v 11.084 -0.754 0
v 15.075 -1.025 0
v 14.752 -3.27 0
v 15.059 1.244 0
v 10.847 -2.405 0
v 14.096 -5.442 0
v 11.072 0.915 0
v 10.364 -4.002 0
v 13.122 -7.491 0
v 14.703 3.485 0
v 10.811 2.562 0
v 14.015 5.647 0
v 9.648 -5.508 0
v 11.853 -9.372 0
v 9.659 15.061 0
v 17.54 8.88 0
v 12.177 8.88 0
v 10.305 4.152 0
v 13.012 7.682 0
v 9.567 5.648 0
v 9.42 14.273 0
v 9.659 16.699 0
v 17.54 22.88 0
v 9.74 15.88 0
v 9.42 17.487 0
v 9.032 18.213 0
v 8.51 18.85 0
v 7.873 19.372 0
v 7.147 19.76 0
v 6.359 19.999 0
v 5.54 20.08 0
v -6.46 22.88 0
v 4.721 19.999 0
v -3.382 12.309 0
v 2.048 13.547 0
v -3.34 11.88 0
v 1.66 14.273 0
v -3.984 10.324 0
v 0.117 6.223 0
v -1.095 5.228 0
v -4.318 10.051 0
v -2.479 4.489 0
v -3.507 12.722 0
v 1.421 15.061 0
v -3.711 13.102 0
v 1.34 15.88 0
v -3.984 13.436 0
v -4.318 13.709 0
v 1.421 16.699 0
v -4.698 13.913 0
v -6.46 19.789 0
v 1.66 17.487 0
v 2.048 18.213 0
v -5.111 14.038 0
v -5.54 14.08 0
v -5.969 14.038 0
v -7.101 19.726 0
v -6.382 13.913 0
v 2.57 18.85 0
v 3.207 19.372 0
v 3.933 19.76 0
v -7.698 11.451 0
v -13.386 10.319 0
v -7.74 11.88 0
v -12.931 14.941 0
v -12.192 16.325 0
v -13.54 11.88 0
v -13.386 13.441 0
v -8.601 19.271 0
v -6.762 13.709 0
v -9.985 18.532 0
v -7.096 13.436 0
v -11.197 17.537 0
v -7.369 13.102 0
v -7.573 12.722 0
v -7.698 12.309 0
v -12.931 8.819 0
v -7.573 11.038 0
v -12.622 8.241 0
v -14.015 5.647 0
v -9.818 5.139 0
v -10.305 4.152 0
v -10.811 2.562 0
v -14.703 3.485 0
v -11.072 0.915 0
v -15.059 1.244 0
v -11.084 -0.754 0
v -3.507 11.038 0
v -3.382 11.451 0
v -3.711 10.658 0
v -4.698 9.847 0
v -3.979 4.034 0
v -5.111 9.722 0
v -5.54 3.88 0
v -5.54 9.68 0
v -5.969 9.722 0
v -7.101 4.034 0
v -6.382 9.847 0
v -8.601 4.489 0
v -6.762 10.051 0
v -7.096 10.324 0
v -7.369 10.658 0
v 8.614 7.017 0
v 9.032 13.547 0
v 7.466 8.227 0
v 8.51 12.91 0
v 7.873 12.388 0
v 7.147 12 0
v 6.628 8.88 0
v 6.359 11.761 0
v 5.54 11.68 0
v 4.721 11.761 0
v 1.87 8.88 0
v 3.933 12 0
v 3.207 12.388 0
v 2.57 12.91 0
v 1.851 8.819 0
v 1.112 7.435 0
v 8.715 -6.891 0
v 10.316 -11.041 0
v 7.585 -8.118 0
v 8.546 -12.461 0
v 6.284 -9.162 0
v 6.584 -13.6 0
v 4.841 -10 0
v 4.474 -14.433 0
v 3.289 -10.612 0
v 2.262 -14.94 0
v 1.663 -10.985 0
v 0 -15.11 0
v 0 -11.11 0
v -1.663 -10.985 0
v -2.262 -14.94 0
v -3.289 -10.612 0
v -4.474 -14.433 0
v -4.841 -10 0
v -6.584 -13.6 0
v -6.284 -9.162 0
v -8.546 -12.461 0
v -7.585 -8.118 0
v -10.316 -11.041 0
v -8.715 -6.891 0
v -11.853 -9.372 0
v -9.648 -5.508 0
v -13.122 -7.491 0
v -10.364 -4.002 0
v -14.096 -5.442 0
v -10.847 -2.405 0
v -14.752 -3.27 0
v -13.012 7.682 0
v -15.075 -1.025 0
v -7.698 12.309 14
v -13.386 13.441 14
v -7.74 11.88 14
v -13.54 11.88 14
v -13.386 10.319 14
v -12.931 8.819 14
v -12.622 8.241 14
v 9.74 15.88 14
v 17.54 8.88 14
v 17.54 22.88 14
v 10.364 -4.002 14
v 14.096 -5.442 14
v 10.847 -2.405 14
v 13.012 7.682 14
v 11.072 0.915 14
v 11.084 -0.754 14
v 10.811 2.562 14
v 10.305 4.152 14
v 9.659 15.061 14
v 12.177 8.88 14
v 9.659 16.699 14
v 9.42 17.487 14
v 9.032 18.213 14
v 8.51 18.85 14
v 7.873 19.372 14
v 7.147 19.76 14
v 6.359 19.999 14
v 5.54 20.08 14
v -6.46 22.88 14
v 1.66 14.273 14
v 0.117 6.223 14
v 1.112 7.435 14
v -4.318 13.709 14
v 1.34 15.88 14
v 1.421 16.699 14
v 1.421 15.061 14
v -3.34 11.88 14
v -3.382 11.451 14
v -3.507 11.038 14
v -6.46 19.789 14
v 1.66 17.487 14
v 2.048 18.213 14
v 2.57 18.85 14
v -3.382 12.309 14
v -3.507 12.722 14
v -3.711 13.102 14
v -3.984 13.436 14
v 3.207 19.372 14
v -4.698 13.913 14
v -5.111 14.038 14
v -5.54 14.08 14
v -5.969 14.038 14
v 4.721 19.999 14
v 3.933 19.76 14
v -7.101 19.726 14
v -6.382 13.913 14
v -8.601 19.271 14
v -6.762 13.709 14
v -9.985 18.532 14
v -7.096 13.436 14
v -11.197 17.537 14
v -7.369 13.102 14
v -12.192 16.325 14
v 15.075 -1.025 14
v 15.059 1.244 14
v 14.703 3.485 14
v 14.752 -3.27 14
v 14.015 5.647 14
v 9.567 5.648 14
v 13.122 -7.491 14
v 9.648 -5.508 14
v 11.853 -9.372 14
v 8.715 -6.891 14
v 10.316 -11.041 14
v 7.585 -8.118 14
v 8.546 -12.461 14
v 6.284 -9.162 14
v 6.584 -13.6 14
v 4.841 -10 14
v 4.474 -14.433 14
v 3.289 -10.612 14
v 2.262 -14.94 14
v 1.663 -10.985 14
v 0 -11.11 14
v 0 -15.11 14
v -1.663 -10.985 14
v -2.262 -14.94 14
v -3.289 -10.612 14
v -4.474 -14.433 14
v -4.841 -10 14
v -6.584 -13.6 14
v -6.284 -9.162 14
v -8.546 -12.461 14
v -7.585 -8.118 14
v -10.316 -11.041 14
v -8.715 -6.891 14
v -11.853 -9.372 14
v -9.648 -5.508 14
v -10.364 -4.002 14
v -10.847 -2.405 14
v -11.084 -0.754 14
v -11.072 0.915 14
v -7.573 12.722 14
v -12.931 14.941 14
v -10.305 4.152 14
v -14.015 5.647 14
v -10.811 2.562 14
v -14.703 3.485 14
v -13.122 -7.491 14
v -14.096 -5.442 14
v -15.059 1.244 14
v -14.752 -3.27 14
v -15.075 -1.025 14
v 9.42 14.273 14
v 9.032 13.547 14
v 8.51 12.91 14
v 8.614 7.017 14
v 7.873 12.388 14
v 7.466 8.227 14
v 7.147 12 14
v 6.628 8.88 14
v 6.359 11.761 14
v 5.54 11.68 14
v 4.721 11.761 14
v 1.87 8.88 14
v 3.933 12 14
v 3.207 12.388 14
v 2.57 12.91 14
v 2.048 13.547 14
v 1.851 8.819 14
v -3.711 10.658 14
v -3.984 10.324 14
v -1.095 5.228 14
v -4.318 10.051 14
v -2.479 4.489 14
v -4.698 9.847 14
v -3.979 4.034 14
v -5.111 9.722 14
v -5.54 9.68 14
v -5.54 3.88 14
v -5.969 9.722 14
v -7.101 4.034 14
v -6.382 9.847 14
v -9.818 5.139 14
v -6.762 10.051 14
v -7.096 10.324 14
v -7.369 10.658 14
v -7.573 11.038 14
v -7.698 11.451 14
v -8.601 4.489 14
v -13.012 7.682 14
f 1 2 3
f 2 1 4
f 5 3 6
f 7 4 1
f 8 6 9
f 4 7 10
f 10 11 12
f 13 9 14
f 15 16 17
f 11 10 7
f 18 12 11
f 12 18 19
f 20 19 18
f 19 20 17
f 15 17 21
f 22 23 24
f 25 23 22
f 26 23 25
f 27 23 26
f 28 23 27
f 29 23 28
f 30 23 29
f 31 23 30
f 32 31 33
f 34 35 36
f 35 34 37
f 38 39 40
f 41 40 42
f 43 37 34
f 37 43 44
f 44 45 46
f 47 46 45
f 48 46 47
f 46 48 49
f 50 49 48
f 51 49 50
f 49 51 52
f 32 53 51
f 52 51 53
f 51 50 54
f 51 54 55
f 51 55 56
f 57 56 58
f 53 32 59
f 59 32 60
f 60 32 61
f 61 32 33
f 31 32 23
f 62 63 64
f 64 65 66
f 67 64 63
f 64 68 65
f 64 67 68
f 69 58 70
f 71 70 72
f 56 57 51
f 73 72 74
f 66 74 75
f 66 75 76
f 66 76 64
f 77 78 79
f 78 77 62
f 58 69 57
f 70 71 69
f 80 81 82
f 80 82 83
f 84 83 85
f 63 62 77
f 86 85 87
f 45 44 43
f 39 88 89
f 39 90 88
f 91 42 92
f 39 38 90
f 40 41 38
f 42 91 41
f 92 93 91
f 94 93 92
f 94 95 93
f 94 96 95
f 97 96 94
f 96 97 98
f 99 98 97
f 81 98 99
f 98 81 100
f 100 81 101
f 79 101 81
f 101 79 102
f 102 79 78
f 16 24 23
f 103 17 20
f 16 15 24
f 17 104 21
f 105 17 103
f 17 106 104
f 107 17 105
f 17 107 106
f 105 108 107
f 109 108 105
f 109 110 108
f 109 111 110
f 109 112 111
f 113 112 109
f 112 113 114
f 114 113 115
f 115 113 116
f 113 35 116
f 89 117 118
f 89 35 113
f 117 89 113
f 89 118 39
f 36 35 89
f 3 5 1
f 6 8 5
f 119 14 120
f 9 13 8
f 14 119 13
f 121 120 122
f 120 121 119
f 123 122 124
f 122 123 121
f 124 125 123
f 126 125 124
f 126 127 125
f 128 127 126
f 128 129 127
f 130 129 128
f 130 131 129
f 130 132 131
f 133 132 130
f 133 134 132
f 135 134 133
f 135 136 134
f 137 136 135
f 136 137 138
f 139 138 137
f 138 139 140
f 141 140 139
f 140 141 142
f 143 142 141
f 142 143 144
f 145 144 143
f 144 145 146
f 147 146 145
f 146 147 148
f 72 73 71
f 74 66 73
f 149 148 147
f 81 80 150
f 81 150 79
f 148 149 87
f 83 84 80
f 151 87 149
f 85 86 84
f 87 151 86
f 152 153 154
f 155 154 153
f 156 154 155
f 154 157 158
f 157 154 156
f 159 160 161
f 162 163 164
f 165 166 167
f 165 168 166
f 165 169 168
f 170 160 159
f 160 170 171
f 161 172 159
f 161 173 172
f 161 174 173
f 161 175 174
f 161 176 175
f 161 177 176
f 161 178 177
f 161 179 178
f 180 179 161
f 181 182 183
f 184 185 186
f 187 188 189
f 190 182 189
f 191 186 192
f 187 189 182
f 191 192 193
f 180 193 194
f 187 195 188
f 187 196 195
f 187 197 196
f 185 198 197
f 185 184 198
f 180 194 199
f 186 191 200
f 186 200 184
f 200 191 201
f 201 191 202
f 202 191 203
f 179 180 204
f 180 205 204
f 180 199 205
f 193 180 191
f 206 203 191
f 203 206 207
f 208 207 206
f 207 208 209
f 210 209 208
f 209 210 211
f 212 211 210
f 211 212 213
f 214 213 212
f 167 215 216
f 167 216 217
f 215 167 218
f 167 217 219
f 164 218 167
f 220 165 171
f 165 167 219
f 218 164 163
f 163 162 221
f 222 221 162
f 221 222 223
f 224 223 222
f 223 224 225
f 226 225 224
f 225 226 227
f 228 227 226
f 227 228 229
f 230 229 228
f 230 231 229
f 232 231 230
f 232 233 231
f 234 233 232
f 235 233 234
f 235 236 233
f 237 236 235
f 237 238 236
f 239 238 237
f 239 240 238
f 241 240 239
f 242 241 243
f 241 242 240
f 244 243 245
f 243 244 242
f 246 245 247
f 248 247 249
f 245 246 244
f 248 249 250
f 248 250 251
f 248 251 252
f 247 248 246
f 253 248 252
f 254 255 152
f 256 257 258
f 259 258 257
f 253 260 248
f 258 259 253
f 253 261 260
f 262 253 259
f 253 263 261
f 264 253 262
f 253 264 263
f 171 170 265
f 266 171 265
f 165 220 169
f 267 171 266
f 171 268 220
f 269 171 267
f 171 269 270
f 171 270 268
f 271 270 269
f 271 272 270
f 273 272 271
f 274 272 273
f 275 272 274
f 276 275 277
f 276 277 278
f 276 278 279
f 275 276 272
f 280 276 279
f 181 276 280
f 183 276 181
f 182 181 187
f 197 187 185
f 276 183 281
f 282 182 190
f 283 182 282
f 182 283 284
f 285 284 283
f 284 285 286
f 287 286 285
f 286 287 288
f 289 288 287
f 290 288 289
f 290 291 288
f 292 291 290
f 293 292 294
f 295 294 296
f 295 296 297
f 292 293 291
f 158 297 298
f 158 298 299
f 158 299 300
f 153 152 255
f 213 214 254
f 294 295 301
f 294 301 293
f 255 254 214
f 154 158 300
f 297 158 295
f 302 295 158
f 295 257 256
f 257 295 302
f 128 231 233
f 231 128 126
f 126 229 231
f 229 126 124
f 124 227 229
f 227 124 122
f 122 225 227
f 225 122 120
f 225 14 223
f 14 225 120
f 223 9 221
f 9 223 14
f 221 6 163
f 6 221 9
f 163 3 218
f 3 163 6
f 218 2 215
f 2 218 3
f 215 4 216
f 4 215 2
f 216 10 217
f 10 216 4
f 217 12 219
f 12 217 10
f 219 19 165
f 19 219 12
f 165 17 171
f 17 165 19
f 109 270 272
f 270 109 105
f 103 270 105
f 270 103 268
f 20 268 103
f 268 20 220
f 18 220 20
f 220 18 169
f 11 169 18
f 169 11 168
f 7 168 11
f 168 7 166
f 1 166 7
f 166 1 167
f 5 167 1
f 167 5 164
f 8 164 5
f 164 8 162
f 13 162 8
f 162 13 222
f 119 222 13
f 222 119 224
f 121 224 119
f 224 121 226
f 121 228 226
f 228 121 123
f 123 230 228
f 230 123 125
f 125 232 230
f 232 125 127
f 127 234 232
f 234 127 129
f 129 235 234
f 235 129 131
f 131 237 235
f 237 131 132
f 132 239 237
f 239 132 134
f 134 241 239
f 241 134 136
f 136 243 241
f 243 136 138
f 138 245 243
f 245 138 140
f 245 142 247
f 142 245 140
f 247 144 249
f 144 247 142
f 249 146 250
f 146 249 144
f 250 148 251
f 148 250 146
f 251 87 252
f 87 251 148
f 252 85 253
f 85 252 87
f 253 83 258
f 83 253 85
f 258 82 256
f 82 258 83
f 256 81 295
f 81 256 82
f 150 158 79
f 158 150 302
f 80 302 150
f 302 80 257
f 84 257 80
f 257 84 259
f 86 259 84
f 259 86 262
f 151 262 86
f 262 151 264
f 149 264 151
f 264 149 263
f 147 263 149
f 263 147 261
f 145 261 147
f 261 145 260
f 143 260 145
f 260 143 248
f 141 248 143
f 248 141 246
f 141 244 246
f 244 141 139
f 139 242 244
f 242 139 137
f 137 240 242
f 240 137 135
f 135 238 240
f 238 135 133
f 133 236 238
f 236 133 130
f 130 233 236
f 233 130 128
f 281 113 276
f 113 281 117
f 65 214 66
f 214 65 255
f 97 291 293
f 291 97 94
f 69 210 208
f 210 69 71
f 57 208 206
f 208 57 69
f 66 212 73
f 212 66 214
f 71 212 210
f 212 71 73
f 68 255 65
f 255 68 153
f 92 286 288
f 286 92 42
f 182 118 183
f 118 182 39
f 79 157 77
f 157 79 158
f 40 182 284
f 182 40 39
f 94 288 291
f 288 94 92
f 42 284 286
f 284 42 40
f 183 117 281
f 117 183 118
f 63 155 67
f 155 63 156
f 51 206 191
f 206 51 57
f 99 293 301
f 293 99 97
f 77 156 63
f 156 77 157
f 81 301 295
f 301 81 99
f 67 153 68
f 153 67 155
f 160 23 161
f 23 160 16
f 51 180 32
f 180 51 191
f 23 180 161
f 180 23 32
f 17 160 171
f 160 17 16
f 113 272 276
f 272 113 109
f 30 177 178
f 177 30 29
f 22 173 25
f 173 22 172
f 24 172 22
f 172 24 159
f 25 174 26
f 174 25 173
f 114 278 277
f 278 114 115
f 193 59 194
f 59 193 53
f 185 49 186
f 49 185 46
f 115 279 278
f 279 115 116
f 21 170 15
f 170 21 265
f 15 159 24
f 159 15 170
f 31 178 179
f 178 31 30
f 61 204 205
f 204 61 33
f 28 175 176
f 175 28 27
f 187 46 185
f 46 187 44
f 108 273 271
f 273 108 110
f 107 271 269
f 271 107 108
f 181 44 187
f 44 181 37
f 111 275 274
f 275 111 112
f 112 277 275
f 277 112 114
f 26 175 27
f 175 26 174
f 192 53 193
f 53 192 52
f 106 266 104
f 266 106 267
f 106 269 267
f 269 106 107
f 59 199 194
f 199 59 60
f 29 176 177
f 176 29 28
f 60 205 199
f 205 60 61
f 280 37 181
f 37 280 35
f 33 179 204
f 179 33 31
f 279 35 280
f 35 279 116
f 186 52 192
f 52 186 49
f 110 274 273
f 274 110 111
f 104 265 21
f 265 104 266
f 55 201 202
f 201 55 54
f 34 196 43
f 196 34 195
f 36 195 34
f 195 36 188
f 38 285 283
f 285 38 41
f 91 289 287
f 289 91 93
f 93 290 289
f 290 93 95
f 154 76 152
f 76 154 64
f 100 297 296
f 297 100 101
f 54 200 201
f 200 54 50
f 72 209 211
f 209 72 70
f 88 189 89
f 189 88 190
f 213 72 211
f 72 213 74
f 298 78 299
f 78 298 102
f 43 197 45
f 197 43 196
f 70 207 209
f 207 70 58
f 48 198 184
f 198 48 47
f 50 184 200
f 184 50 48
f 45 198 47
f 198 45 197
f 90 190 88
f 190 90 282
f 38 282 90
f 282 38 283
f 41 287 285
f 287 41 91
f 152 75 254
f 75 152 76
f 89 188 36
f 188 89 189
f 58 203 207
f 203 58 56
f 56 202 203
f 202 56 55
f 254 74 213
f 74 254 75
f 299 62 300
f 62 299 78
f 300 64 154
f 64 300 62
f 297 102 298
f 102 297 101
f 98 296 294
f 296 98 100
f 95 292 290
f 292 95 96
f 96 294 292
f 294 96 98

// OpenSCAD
$fn = 32;

// ----------------------------------------------------------------------
// Pipe clamp: 30.22 mm ring, 4 mm wall, 14 mm wide
// ----------------------------------------------------------------------

// --- parameters (mm) ---
outer_r = 15.11;          // clamp outside radius
inner_r = 11.11;          // pipe bore radius
band = 4;                 // band thickness
clamp_w = 14;             // clamp width
opening = 50;             // opening angle between the ends
lug_w = 24;               // lug width
lug_len = 14;             // lug length
bolt_d = 8.4;             // bolt hole
knuckle_d = 16;           // hinge knuckle diameter
pin_d = 4.4;              // hinge pin hole

clamp_profile = [[-6.386, 13.694], [-8.364, 12.584], [-10.154, 11.19], [-11.715, 9.543], [-13.012, 7.682], [-14.015, 5.647], [-14.703, 3.485], [-15.059, 1.244], [-15.075, -1.025], [-14.752, -3.27], [-14.096, -5.442], [-13.122, -7.491], [-11.853, -9.372], [-10.316, -11.041], [-8.546, -12.461], [-6.584, -13.6], [-4.474, -14.433], [-2.262, -14.94], [0, -15.11], [2.262, -14.94], [4.474, -14.433], [6.584, -13.6], [8.546, -12.461], [10.316, -11.041], [11.853, -9.372], [13.122, -7.491], [14.096, -5.442], [14.752, -3.27], [15.075, -1.025], [15.059, 1.244], [14.703, 3.485], [14.015, 5.647], [13.012, 7.682], [11.715, 9.543], [10.154, 11.19], [8.364, 12.584], [6.386, 13.694], [4.695, 10.069], [6.15, 9.253], [7.466, 8.227], [8.614, 7.017], [9.567, 5.648], [10.305, 4.152], [10.811, 2.562], [11.072, 0.915], [11.084, -0.754], [10.847, -2.405], [10.364, -4.002], [9.648, -5.508], [8.715, -6.891], [7.585, -8.118], [6.284, -9.162], [4.841, -10], [3.289, -10.612], [1.663, -10.985], [0, -11.11], [-1.663, -10.985], [-3.289, -10.612], [-4.841, -10], [-6.284, -9.162], [-7.585, -8.118], [-8.715, -6.891], [-9.648, -5.508], [-10.364, -4.002], [-10.847, -2.405], [-11.084, -0.754], [-11.072, 0.915], [-10.811, 2.562], [-10.305, 4.152], [-9.567, 5.648], [-8.614, 7.017], [-7.466, 8.227], [-6.15, 9.253], [-4.695, 10.069]];

difference() {
  union() {
    linear_extrude(height = clamp_w) polygon(clamp_profile);
    /* hinge knuckle, sunk 2 mm into the band end */
    translate([-5.54, 11.88, 0]) cylinder(h = clamp_w, d = knuckle_d);
    /* bolt lug on the other end */
    translate([-6.46, 8.88, 0]) cube([lug_w, 14, clamp_w]);
  }
  translate([5.54, 15.88, -2.5]) cylinder(h = clamp_w + 5, d = bolt_d);
  translate([-5.54, 11.88, -2.5]) cylinder(h = clamp_w + 5, d = pin_d);
}
